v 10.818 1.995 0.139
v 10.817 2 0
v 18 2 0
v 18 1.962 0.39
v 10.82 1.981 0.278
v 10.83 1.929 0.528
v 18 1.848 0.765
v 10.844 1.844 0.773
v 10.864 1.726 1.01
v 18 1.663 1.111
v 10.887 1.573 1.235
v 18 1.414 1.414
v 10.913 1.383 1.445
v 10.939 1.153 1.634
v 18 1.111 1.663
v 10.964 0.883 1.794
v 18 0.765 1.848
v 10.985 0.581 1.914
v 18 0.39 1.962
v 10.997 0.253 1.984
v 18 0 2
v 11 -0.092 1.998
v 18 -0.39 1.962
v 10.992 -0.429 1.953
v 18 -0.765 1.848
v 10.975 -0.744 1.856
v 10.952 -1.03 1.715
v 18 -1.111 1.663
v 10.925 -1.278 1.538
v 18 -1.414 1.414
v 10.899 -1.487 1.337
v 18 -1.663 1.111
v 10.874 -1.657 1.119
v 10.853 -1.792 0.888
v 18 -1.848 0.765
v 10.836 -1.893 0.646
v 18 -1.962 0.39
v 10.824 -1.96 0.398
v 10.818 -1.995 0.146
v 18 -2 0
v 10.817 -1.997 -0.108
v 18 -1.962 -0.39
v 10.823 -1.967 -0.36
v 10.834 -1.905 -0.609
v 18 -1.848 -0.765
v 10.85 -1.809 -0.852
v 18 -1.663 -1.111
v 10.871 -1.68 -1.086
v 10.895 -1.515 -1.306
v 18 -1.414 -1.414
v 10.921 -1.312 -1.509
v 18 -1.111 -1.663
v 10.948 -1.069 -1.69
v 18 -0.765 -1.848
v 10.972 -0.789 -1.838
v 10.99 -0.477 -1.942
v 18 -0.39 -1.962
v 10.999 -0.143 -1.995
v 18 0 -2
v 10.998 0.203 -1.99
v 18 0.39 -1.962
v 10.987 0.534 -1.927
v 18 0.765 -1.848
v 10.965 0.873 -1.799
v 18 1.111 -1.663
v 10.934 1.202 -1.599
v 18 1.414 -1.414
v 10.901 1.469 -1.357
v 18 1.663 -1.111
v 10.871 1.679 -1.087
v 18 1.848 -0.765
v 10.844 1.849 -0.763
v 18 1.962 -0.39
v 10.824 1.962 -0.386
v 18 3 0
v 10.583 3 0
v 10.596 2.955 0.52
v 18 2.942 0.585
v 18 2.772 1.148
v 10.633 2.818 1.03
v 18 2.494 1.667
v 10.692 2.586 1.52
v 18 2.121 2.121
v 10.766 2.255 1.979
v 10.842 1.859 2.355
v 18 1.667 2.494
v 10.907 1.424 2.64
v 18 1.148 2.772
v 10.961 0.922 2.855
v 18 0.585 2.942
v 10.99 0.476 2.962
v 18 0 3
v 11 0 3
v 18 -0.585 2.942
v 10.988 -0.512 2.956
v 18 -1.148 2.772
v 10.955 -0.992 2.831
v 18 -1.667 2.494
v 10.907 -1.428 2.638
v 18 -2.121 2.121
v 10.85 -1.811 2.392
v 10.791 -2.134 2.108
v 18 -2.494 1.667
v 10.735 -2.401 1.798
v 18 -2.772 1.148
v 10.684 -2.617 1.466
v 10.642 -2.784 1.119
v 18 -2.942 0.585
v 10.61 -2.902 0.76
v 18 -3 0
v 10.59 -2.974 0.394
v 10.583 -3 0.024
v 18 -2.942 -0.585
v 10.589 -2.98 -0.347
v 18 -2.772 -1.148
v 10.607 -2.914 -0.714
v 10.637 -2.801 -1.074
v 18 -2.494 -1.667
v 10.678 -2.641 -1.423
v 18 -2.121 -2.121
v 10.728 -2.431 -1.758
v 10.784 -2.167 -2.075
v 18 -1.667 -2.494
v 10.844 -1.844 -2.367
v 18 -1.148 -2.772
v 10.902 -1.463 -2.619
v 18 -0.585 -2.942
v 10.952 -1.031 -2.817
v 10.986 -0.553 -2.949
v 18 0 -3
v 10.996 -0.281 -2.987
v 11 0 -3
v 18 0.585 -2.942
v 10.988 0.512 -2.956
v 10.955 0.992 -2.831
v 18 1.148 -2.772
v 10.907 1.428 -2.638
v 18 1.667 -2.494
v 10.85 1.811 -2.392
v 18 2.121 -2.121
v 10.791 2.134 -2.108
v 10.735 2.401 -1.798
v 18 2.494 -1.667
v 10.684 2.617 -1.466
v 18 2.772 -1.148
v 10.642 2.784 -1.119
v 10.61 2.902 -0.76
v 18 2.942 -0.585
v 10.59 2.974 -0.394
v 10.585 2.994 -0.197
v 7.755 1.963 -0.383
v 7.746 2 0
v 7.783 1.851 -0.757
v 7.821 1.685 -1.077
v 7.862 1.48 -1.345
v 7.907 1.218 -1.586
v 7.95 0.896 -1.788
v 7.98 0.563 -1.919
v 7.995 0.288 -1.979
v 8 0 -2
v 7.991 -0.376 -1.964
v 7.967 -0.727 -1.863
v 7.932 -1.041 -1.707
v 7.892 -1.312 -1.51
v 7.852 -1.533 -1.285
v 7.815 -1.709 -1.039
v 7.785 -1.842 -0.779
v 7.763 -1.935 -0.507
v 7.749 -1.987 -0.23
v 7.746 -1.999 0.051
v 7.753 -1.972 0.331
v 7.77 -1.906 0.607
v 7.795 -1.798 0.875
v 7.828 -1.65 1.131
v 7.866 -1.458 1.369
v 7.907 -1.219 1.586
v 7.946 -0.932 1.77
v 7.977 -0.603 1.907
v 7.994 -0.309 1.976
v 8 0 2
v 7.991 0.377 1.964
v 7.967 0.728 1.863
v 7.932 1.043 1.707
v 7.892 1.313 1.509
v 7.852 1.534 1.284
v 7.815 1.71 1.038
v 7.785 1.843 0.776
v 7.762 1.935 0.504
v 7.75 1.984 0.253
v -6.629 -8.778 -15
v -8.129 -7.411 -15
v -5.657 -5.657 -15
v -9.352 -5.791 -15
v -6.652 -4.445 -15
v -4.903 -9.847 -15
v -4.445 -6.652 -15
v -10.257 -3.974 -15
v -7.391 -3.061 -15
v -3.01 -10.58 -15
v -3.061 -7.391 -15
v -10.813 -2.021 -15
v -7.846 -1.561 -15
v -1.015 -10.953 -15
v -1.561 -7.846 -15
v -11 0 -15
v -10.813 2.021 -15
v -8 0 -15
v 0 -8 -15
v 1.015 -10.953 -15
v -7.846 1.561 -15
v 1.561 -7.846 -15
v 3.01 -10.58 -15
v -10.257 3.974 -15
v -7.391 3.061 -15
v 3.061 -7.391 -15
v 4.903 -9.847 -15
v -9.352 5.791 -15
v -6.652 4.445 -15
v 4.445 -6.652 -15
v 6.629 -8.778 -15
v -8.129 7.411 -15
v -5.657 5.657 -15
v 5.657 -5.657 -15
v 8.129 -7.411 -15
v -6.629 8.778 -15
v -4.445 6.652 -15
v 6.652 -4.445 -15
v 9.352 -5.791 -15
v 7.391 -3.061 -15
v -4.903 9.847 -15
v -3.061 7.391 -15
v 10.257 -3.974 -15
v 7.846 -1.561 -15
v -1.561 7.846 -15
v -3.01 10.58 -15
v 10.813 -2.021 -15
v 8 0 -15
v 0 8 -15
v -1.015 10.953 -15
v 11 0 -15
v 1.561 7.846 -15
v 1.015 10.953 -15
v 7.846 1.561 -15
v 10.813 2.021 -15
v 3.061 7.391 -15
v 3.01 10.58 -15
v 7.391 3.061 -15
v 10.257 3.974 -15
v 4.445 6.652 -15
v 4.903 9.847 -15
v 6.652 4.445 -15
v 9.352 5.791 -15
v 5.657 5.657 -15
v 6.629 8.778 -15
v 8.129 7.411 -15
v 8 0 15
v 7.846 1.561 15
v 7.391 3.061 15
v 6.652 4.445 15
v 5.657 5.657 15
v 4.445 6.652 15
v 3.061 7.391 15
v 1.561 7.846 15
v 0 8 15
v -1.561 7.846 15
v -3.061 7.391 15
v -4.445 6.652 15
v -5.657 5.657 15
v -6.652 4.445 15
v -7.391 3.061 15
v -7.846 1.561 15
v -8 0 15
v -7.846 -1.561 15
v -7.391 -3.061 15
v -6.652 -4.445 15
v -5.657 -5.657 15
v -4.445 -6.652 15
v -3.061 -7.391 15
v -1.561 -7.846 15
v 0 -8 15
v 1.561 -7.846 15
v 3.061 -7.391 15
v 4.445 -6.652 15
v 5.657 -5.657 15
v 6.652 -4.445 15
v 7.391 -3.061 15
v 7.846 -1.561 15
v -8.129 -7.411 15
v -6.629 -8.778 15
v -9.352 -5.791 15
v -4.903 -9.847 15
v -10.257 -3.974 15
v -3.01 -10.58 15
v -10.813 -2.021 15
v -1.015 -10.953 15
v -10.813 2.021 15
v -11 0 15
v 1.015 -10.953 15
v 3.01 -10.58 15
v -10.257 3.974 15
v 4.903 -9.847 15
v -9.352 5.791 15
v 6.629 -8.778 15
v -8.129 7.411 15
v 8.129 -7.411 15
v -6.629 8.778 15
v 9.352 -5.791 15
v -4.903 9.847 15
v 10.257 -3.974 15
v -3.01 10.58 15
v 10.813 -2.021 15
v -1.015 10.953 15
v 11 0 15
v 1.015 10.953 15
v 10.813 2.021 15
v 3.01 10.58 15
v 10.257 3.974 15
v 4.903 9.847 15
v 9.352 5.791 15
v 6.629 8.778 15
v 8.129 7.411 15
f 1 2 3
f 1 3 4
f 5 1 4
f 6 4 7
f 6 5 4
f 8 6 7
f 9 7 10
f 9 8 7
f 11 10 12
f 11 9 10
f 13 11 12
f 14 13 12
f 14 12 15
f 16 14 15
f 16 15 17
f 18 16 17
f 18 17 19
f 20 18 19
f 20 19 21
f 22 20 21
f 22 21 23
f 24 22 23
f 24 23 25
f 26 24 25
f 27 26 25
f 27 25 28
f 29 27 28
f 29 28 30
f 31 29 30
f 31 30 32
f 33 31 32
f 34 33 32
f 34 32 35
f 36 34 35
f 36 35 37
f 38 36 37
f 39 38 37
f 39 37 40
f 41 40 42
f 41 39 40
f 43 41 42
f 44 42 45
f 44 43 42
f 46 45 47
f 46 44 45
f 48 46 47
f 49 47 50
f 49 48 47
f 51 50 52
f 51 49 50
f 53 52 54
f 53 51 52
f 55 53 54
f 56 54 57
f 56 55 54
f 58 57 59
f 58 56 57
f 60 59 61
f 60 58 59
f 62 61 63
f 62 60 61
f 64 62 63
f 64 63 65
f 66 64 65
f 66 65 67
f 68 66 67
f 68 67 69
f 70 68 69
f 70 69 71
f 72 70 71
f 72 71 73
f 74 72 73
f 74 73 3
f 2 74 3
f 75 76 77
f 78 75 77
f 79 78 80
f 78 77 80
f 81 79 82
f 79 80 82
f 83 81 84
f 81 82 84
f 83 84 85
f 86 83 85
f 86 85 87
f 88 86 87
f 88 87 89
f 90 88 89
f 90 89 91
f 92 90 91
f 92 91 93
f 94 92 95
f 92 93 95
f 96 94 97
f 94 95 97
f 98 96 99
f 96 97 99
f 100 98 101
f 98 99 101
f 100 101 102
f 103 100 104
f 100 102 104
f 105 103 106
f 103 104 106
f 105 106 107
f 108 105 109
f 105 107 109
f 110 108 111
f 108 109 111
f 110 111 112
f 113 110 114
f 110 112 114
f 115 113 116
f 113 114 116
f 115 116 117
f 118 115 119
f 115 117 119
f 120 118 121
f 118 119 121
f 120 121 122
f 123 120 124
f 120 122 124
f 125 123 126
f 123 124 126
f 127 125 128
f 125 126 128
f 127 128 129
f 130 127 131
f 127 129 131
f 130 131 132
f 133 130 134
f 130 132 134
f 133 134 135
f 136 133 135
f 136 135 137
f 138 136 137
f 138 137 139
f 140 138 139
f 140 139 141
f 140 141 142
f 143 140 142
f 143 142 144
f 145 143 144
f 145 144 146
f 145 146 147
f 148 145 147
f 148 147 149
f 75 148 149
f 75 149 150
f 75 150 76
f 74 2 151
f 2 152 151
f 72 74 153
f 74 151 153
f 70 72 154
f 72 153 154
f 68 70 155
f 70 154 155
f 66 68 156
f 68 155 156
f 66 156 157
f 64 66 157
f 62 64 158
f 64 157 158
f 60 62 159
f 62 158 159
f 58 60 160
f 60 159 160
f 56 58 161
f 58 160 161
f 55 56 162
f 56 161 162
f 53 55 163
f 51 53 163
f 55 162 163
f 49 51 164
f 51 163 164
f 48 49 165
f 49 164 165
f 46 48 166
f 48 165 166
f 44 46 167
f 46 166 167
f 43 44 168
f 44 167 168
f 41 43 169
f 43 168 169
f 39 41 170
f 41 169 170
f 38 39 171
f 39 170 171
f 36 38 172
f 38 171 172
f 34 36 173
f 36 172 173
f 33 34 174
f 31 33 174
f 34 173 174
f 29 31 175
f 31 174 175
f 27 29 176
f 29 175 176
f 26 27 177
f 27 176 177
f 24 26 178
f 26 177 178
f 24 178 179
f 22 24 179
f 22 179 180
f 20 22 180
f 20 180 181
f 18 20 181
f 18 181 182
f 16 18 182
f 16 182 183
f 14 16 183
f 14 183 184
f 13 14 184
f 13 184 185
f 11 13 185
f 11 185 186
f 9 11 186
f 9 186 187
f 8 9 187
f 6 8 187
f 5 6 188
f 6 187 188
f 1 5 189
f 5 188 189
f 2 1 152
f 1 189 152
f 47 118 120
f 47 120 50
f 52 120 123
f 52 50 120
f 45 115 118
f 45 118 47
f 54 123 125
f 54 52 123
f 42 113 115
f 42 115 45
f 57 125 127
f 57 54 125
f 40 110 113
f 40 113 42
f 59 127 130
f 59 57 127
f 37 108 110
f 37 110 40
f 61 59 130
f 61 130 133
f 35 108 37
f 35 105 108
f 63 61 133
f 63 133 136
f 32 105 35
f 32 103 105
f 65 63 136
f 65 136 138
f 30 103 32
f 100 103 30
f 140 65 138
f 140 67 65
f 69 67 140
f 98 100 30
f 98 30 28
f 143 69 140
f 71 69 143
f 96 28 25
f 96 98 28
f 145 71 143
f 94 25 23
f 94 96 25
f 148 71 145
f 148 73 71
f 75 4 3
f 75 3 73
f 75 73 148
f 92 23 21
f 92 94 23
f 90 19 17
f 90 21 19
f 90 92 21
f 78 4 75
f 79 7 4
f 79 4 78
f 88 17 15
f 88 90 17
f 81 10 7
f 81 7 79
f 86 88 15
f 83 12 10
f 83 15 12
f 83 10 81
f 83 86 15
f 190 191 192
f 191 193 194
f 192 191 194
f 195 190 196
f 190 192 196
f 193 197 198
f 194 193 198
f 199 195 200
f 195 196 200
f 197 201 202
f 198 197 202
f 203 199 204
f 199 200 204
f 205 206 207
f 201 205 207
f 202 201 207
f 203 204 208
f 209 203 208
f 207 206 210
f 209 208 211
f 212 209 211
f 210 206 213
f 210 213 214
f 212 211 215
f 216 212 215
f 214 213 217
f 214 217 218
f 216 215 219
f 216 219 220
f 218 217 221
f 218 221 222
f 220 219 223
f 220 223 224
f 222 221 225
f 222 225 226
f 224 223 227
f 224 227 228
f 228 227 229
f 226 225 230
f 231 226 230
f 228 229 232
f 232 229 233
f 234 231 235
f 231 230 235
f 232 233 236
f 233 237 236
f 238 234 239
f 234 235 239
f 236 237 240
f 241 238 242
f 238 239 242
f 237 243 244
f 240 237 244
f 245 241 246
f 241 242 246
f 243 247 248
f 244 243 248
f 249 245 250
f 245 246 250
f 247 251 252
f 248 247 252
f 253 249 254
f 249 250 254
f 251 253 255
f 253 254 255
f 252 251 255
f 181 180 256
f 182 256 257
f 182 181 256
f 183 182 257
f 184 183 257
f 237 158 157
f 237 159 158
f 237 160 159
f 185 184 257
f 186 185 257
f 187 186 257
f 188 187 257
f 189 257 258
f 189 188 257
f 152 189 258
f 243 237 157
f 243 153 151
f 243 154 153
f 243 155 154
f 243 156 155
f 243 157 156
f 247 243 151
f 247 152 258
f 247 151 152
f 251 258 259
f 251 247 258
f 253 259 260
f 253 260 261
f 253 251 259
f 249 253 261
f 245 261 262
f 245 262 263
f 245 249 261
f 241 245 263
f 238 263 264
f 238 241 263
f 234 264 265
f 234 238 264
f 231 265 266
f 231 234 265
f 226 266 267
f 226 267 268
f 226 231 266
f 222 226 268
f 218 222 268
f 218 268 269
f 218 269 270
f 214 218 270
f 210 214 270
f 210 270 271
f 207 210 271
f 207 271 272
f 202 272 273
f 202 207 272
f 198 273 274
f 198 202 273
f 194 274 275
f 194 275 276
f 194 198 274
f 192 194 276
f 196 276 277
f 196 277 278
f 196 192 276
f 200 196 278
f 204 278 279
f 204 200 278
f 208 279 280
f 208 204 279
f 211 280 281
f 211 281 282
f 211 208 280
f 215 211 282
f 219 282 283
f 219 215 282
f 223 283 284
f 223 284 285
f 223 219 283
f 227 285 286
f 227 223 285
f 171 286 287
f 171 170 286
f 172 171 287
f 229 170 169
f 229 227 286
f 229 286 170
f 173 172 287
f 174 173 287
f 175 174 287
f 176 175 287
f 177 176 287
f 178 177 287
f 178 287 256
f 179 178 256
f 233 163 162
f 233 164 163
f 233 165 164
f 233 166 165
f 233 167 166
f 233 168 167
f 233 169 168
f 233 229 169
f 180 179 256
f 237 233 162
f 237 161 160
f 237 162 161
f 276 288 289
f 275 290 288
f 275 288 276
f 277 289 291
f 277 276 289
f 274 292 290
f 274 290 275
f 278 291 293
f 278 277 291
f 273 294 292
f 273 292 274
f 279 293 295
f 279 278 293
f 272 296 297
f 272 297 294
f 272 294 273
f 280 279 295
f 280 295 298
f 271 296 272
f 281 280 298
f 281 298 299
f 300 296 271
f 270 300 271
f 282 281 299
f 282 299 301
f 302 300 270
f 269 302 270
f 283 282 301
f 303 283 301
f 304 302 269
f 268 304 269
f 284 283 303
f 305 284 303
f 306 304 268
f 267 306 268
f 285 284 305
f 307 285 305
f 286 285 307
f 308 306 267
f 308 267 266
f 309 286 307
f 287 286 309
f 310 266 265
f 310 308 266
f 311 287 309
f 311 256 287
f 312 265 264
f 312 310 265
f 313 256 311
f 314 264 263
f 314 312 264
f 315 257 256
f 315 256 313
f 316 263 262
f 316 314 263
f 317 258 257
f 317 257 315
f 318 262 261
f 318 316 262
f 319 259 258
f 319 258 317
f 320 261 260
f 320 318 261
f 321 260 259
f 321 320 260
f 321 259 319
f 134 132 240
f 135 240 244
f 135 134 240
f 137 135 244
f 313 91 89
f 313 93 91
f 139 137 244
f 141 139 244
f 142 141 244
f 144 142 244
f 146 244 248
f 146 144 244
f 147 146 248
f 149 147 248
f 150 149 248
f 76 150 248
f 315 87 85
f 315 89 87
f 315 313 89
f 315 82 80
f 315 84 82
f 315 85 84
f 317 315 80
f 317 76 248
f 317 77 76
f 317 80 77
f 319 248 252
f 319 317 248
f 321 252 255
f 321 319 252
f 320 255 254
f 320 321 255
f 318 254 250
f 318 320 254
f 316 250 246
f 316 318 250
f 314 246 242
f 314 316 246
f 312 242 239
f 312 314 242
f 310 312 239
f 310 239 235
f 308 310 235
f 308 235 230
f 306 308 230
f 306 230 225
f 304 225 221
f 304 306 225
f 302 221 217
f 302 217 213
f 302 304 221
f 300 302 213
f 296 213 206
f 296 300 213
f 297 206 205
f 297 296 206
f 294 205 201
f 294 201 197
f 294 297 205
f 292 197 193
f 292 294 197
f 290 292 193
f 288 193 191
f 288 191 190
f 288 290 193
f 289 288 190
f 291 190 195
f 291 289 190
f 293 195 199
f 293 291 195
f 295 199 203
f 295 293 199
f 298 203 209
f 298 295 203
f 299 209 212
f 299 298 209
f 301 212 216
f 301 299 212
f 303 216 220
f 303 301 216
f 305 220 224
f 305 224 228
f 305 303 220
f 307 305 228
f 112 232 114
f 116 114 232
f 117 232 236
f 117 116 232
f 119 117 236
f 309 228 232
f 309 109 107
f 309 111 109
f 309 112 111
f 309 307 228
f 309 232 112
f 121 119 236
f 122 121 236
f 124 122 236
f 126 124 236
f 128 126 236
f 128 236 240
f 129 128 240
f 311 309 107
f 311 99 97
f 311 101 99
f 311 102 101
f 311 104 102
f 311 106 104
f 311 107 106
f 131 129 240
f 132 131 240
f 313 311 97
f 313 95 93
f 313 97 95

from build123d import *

# Parameters (mm, degrees)
F0_R          = 11
F0_R_2        = 8
F1_DEPTH      = 15
F1_DEPTH_BACK = 15
F4_R          = 3
F4_R_2        = 2
F5_DEPTH      = 10
F6_D          = 4
F6_DEPTH      = 18.0010001


with BuildPart() as f1:
    # F0 (on Top) → F1 (new body, two sides)
    with BuildSketch(Plane.XY) as f1_sk:
        Circle(F0_R)
        Circle(F0_R_2, mode=Mode.SUBTRACT)
    extrude(amount=F1_DEPTH)
    extrude(f1_sk.sketch, amount=-F1_DEPTH_BACK)

    # F4 (on offset) → F5 (join)
    with BuildSketch(Plane.YZ.offset(8)):
        Circle(F4_R)
        Circle(F4_R_2, mode=Mode.SUBTRACT)
    extrude(amount=F5_DEPTH)

    # F6 (through all, one way)
    with BuildSketch(Plane(origin=(0, 0, 0), x_dir=(0, 1, 0), z_dir=(-1, 0, 0))):
        with Locations((0, 0)):
            Circle(F6_D / 2)
    extrude(amount=-F6_DEPTH, mode=Mode.SUBTRACT)


solid = f1.part
